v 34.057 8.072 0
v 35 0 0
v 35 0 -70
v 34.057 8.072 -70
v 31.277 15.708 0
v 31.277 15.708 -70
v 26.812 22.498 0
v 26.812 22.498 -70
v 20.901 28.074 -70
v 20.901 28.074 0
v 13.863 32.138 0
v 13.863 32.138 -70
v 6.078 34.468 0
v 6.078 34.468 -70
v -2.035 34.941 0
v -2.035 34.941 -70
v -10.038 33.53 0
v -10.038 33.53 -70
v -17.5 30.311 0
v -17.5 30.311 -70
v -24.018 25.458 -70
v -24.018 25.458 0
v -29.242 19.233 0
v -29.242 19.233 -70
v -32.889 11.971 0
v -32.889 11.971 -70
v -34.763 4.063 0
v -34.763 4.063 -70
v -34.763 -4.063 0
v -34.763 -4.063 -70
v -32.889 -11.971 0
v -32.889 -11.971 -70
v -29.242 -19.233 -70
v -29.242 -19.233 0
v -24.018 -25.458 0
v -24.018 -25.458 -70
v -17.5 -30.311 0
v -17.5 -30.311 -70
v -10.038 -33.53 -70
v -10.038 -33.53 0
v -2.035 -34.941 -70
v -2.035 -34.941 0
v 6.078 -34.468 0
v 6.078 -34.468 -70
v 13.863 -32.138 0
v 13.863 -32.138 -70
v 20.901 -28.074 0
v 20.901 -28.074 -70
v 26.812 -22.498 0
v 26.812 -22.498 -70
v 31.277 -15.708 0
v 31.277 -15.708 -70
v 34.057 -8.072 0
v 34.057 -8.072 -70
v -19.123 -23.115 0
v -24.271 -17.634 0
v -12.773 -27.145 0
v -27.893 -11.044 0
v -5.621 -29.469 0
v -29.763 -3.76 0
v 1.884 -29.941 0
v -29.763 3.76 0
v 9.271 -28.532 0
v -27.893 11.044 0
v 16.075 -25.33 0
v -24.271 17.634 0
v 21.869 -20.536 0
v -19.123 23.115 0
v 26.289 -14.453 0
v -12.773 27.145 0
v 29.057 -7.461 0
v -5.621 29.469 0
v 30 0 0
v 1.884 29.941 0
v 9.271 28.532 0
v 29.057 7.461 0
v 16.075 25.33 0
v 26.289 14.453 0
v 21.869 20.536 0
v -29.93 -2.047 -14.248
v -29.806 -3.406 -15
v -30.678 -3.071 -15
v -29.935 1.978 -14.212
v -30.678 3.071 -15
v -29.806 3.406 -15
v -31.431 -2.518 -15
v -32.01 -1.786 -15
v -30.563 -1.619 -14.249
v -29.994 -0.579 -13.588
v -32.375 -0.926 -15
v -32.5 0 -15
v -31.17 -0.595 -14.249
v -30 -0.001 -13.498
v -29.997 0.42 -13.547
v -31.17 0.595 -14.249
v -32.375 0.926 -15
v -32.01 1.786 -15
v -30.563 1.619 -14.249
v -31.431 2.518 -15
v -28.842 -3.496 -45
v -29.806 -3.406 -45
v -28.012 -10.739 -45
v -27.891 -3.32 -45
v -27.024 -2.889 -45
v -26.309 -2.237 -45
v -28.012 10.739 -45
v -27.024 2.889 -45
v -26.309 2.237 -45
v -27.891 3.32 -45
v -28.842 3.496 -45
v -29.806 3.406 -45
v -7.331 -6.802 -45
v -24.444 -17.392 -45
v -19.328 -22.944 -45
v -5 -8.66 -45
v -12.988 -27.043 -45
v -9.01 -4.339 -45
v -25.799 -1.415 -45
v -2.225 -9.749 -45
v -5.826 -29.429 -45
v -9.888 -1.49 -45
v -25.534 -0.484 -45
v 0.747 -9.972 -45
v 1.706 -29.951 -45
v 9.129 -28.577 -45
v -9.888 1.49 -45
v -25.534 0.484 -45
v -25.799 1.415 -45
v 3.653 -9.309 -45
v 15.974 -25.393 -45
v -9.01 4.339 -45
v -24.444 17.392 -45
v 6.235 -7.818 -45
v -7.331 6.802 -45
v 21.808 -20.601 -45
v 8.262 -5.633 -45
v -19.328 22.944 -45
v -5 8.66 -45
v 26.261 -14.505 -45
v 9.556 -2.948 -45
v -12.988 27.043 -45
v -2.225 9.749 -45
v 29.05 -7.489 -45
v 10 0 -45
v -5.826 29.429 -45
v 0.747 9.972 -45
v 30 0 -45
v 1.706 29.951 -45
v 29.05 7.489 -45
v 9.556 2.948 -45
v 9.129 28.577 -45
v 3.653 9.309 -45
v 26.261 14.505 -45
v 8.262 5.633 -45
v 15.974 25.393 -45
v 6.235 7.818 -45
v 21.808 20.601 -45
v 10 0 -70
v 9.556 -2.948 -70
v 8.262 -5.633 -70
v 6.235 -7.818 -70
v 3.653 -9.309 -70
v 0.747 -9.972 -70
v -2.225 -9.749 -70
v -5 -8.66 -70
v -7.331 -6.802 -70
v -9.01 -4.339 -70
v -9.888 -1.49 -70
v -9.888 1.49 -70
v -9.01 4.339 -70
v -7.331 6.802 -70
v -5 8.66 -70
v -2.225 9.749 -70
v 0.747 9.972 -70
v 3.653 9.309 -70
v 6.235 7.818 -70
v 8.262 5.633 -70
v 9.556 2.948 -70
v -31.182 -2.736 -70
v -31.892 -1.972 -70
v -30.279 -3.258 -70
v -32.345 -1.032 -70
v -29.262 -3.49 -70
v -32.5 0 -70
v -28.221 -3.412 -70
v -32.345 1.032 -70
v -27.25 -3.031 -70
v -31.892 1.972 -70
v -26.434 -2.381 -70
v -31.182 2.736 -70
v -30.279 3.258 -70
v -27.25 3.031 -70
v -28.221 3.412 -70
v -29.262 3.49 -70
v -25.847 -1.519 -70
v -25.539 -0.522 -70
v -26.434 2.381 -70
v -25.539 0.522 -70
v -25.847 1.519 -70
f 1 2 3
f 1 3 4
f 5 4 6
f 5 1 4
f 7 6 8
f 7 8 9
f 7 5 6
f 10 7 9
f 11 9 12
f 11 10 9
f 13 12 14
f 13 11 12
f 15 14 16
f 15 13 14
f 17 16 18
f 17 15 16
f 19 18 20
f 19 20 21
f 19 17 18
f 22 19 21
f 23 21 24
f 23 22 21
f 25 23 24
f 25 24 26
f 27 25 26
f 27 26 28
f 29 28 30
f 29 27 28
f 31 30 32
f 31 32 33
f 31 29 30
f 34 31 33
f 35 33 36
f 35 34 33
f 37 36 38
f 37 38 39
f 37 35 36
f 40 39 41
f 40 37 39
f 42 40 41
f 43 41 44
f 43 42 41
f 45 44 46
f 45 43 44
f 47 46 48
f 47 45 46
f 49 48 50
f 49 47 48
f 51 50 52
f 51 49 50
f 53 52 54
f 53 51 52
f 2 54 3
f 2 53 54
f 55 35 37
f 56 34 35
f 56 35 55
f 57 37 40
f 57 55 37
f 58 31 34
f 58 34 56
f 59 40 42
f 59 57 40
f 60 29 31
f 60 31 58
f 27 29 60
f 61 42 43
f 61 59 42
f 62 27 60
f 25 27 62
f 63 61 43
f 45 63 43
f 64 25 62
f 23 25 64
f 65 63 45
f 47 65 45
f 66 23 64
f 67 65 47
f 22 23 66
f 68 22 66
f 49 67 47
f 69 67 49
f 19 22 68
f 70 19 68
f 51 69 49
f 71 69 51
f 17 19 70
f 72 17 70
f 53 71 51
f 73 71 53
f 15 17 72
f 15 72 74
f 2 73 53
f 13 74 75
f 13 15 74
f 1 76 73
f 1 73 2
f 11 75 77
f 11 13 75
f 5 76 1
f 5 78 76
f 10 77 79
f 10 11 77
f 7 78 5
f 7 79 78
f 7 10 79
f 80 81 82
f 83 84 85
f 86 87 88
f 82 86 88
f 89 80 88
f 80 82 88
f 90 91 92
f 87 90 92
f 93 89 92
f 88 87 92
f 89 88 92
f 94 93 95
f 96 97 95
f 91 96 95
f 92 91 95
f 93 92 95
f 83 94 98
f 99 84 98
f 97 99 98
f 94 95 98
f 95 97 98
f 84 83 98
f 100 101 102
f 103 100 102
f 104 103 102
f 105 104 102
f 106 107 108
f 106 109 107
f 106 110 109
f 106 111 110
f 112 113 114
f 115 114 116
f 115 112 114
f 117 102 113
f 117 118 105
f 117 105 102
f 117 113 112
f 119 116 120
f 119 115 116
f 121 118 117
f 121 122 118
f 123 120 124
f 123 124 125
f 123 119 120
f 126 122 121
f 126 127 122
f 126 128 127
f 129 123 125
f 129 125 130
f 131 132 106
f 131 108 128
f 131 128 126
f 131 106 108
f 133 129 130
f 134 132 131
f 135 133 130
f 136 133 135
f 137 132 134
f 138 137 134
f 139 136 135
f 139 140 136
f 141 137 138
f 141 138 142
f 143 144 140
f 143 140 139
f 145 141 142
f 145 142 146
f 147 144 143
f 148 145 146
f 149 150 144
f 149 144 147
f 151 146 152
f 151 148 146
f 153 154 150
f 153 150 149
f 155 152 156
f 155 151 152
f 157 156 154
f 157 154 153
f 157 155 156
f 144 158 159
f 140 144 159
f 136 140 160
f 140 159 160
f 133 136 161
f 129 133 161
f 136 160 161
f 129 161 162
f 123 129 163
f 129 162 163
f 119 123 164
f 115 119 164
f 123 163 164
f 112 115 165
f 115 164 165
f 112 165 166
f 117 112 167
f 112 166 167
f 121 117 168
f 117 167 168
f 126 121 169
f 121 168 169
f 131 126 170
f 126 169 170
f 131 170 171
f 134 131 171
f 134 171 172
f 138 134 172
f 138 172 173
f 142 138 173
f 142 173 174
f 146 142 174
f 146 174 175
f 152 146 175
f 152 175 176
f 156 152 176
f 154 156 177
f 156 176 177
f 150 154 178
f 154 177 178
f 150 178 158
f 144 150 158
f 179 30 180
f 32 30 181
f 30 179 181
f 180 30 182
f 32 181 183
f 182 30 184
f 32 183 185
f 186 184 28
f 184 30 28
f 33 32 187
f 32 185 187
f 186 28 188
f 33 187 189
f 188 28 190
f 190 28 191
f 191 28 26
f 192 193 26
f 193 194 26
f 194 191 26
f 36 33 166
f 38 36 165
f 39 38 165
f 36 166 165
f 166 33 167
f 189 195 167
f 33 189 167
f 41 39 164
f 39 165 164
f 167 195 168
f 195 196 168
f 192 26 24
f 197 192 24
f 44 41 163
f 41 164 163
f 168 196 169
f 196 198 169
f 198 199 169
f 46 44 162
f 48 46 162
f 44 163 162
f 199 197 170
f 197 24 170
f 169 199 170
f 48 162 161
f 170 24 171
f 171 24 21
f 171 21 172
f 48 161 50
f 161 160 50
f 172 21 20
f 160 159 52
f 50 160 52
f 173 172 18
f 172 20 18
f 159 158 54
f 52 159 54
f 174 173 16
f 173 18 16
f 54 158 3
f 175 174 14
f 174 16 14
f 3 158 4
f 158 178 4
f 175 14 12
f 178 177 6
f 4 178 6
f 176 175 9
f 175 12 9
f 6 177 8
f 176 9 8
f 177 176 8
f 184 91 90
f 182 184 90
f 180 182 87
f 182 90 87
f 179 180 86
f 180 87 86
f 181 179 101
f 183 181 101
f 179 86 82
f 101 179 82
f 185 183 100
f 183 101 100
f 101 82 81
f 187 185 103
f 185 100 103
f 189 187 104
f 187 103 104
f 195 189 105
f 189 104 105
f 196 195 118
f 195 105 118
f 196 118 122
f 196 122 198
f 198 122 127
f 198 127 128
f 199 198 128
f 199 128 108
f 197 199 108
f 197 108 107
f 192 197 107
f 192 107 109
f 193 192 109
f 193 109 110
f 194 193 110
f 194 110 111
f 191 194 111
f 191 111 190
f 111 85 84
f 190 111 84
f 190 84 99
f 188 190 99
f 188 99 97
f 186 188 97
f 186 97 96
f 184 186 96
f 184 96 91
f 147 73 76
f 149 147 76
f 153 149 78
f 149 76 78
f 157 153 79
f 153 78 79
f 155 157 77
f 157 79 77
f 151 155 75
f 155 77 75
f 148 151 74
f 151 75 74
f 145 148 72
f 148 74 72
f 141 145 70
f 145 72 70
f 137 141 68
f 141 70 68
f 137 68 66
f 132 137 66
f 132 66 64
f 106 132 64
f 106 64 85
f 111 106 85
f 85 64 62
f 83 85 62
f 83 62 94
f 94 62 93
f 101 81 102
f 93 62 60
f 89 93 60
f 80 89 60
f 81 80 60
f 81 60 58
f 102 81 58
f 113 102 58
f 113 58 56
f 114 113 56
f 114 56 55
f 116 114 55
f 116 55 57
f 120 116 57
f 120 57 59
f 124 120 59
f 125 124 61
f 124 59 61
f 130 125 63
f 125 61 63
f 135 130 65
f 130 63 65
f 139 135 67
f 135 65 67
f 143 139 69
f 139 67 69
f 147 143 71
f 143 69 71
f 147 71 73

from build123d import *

# Parameters (mm, degrees)
F0_R     = 35
F1_DEPTH = 70
F2_T     = -5
F3_DEPTH = 20
F5_D     = 7
F5_DEPTH = 55
F5_TIP   = 2.1030121666
F6_R     = 10
F7_DEPTH = 25


with BuildPart() as f1:
    # F0 (on Top) → F1 (new body)
    with BuildSketch(Plane.XY):
        Circle(F0_R)
    extrude(amount=-F1_DEPTH)

    # F2
    f2_openings = [f1.faces().sort_by_distance(p)[0] for p in [
        (0, 0, 0),
    ]]
    offset(amount=F2_T, openings=f2_openings)

    # F3 (add): a face of the model
    f3_faces = [f1.faces().sort_by_distance(p)[0] for p in [
        (0, 0, -65),
    ]]
    extrude(f3_faces, amount=F3_DEPTH)

    # F5
    with Locations(Plane(origin=(0, 0, -70), x_dir=(1, 0, 0), z_dir=(0, 0, -1))):
        with Locations((-29, 0)):
            Hole(F5_D / 2, depth=F5_DEPTH)
            with Locations((0, 0, -(F5_DEPTH + F5_TIP / 2))):  # 118° drill point
                Cone(0, F5_D / 2, F5_TIP, mode=Mode.SUBTRACT)

    # F6 (on face) → F7 (cut, through all)
    with BuildSketch(Plane(origin=(0, 0, -70), x_dir=(1, 0, 0), z_dir=(0, 0, -1))):
        Circle(F6_R)
    extrude(amount=-F7_DEPTH, mode=Mode.SUBTRACT)


solid = f1.part
